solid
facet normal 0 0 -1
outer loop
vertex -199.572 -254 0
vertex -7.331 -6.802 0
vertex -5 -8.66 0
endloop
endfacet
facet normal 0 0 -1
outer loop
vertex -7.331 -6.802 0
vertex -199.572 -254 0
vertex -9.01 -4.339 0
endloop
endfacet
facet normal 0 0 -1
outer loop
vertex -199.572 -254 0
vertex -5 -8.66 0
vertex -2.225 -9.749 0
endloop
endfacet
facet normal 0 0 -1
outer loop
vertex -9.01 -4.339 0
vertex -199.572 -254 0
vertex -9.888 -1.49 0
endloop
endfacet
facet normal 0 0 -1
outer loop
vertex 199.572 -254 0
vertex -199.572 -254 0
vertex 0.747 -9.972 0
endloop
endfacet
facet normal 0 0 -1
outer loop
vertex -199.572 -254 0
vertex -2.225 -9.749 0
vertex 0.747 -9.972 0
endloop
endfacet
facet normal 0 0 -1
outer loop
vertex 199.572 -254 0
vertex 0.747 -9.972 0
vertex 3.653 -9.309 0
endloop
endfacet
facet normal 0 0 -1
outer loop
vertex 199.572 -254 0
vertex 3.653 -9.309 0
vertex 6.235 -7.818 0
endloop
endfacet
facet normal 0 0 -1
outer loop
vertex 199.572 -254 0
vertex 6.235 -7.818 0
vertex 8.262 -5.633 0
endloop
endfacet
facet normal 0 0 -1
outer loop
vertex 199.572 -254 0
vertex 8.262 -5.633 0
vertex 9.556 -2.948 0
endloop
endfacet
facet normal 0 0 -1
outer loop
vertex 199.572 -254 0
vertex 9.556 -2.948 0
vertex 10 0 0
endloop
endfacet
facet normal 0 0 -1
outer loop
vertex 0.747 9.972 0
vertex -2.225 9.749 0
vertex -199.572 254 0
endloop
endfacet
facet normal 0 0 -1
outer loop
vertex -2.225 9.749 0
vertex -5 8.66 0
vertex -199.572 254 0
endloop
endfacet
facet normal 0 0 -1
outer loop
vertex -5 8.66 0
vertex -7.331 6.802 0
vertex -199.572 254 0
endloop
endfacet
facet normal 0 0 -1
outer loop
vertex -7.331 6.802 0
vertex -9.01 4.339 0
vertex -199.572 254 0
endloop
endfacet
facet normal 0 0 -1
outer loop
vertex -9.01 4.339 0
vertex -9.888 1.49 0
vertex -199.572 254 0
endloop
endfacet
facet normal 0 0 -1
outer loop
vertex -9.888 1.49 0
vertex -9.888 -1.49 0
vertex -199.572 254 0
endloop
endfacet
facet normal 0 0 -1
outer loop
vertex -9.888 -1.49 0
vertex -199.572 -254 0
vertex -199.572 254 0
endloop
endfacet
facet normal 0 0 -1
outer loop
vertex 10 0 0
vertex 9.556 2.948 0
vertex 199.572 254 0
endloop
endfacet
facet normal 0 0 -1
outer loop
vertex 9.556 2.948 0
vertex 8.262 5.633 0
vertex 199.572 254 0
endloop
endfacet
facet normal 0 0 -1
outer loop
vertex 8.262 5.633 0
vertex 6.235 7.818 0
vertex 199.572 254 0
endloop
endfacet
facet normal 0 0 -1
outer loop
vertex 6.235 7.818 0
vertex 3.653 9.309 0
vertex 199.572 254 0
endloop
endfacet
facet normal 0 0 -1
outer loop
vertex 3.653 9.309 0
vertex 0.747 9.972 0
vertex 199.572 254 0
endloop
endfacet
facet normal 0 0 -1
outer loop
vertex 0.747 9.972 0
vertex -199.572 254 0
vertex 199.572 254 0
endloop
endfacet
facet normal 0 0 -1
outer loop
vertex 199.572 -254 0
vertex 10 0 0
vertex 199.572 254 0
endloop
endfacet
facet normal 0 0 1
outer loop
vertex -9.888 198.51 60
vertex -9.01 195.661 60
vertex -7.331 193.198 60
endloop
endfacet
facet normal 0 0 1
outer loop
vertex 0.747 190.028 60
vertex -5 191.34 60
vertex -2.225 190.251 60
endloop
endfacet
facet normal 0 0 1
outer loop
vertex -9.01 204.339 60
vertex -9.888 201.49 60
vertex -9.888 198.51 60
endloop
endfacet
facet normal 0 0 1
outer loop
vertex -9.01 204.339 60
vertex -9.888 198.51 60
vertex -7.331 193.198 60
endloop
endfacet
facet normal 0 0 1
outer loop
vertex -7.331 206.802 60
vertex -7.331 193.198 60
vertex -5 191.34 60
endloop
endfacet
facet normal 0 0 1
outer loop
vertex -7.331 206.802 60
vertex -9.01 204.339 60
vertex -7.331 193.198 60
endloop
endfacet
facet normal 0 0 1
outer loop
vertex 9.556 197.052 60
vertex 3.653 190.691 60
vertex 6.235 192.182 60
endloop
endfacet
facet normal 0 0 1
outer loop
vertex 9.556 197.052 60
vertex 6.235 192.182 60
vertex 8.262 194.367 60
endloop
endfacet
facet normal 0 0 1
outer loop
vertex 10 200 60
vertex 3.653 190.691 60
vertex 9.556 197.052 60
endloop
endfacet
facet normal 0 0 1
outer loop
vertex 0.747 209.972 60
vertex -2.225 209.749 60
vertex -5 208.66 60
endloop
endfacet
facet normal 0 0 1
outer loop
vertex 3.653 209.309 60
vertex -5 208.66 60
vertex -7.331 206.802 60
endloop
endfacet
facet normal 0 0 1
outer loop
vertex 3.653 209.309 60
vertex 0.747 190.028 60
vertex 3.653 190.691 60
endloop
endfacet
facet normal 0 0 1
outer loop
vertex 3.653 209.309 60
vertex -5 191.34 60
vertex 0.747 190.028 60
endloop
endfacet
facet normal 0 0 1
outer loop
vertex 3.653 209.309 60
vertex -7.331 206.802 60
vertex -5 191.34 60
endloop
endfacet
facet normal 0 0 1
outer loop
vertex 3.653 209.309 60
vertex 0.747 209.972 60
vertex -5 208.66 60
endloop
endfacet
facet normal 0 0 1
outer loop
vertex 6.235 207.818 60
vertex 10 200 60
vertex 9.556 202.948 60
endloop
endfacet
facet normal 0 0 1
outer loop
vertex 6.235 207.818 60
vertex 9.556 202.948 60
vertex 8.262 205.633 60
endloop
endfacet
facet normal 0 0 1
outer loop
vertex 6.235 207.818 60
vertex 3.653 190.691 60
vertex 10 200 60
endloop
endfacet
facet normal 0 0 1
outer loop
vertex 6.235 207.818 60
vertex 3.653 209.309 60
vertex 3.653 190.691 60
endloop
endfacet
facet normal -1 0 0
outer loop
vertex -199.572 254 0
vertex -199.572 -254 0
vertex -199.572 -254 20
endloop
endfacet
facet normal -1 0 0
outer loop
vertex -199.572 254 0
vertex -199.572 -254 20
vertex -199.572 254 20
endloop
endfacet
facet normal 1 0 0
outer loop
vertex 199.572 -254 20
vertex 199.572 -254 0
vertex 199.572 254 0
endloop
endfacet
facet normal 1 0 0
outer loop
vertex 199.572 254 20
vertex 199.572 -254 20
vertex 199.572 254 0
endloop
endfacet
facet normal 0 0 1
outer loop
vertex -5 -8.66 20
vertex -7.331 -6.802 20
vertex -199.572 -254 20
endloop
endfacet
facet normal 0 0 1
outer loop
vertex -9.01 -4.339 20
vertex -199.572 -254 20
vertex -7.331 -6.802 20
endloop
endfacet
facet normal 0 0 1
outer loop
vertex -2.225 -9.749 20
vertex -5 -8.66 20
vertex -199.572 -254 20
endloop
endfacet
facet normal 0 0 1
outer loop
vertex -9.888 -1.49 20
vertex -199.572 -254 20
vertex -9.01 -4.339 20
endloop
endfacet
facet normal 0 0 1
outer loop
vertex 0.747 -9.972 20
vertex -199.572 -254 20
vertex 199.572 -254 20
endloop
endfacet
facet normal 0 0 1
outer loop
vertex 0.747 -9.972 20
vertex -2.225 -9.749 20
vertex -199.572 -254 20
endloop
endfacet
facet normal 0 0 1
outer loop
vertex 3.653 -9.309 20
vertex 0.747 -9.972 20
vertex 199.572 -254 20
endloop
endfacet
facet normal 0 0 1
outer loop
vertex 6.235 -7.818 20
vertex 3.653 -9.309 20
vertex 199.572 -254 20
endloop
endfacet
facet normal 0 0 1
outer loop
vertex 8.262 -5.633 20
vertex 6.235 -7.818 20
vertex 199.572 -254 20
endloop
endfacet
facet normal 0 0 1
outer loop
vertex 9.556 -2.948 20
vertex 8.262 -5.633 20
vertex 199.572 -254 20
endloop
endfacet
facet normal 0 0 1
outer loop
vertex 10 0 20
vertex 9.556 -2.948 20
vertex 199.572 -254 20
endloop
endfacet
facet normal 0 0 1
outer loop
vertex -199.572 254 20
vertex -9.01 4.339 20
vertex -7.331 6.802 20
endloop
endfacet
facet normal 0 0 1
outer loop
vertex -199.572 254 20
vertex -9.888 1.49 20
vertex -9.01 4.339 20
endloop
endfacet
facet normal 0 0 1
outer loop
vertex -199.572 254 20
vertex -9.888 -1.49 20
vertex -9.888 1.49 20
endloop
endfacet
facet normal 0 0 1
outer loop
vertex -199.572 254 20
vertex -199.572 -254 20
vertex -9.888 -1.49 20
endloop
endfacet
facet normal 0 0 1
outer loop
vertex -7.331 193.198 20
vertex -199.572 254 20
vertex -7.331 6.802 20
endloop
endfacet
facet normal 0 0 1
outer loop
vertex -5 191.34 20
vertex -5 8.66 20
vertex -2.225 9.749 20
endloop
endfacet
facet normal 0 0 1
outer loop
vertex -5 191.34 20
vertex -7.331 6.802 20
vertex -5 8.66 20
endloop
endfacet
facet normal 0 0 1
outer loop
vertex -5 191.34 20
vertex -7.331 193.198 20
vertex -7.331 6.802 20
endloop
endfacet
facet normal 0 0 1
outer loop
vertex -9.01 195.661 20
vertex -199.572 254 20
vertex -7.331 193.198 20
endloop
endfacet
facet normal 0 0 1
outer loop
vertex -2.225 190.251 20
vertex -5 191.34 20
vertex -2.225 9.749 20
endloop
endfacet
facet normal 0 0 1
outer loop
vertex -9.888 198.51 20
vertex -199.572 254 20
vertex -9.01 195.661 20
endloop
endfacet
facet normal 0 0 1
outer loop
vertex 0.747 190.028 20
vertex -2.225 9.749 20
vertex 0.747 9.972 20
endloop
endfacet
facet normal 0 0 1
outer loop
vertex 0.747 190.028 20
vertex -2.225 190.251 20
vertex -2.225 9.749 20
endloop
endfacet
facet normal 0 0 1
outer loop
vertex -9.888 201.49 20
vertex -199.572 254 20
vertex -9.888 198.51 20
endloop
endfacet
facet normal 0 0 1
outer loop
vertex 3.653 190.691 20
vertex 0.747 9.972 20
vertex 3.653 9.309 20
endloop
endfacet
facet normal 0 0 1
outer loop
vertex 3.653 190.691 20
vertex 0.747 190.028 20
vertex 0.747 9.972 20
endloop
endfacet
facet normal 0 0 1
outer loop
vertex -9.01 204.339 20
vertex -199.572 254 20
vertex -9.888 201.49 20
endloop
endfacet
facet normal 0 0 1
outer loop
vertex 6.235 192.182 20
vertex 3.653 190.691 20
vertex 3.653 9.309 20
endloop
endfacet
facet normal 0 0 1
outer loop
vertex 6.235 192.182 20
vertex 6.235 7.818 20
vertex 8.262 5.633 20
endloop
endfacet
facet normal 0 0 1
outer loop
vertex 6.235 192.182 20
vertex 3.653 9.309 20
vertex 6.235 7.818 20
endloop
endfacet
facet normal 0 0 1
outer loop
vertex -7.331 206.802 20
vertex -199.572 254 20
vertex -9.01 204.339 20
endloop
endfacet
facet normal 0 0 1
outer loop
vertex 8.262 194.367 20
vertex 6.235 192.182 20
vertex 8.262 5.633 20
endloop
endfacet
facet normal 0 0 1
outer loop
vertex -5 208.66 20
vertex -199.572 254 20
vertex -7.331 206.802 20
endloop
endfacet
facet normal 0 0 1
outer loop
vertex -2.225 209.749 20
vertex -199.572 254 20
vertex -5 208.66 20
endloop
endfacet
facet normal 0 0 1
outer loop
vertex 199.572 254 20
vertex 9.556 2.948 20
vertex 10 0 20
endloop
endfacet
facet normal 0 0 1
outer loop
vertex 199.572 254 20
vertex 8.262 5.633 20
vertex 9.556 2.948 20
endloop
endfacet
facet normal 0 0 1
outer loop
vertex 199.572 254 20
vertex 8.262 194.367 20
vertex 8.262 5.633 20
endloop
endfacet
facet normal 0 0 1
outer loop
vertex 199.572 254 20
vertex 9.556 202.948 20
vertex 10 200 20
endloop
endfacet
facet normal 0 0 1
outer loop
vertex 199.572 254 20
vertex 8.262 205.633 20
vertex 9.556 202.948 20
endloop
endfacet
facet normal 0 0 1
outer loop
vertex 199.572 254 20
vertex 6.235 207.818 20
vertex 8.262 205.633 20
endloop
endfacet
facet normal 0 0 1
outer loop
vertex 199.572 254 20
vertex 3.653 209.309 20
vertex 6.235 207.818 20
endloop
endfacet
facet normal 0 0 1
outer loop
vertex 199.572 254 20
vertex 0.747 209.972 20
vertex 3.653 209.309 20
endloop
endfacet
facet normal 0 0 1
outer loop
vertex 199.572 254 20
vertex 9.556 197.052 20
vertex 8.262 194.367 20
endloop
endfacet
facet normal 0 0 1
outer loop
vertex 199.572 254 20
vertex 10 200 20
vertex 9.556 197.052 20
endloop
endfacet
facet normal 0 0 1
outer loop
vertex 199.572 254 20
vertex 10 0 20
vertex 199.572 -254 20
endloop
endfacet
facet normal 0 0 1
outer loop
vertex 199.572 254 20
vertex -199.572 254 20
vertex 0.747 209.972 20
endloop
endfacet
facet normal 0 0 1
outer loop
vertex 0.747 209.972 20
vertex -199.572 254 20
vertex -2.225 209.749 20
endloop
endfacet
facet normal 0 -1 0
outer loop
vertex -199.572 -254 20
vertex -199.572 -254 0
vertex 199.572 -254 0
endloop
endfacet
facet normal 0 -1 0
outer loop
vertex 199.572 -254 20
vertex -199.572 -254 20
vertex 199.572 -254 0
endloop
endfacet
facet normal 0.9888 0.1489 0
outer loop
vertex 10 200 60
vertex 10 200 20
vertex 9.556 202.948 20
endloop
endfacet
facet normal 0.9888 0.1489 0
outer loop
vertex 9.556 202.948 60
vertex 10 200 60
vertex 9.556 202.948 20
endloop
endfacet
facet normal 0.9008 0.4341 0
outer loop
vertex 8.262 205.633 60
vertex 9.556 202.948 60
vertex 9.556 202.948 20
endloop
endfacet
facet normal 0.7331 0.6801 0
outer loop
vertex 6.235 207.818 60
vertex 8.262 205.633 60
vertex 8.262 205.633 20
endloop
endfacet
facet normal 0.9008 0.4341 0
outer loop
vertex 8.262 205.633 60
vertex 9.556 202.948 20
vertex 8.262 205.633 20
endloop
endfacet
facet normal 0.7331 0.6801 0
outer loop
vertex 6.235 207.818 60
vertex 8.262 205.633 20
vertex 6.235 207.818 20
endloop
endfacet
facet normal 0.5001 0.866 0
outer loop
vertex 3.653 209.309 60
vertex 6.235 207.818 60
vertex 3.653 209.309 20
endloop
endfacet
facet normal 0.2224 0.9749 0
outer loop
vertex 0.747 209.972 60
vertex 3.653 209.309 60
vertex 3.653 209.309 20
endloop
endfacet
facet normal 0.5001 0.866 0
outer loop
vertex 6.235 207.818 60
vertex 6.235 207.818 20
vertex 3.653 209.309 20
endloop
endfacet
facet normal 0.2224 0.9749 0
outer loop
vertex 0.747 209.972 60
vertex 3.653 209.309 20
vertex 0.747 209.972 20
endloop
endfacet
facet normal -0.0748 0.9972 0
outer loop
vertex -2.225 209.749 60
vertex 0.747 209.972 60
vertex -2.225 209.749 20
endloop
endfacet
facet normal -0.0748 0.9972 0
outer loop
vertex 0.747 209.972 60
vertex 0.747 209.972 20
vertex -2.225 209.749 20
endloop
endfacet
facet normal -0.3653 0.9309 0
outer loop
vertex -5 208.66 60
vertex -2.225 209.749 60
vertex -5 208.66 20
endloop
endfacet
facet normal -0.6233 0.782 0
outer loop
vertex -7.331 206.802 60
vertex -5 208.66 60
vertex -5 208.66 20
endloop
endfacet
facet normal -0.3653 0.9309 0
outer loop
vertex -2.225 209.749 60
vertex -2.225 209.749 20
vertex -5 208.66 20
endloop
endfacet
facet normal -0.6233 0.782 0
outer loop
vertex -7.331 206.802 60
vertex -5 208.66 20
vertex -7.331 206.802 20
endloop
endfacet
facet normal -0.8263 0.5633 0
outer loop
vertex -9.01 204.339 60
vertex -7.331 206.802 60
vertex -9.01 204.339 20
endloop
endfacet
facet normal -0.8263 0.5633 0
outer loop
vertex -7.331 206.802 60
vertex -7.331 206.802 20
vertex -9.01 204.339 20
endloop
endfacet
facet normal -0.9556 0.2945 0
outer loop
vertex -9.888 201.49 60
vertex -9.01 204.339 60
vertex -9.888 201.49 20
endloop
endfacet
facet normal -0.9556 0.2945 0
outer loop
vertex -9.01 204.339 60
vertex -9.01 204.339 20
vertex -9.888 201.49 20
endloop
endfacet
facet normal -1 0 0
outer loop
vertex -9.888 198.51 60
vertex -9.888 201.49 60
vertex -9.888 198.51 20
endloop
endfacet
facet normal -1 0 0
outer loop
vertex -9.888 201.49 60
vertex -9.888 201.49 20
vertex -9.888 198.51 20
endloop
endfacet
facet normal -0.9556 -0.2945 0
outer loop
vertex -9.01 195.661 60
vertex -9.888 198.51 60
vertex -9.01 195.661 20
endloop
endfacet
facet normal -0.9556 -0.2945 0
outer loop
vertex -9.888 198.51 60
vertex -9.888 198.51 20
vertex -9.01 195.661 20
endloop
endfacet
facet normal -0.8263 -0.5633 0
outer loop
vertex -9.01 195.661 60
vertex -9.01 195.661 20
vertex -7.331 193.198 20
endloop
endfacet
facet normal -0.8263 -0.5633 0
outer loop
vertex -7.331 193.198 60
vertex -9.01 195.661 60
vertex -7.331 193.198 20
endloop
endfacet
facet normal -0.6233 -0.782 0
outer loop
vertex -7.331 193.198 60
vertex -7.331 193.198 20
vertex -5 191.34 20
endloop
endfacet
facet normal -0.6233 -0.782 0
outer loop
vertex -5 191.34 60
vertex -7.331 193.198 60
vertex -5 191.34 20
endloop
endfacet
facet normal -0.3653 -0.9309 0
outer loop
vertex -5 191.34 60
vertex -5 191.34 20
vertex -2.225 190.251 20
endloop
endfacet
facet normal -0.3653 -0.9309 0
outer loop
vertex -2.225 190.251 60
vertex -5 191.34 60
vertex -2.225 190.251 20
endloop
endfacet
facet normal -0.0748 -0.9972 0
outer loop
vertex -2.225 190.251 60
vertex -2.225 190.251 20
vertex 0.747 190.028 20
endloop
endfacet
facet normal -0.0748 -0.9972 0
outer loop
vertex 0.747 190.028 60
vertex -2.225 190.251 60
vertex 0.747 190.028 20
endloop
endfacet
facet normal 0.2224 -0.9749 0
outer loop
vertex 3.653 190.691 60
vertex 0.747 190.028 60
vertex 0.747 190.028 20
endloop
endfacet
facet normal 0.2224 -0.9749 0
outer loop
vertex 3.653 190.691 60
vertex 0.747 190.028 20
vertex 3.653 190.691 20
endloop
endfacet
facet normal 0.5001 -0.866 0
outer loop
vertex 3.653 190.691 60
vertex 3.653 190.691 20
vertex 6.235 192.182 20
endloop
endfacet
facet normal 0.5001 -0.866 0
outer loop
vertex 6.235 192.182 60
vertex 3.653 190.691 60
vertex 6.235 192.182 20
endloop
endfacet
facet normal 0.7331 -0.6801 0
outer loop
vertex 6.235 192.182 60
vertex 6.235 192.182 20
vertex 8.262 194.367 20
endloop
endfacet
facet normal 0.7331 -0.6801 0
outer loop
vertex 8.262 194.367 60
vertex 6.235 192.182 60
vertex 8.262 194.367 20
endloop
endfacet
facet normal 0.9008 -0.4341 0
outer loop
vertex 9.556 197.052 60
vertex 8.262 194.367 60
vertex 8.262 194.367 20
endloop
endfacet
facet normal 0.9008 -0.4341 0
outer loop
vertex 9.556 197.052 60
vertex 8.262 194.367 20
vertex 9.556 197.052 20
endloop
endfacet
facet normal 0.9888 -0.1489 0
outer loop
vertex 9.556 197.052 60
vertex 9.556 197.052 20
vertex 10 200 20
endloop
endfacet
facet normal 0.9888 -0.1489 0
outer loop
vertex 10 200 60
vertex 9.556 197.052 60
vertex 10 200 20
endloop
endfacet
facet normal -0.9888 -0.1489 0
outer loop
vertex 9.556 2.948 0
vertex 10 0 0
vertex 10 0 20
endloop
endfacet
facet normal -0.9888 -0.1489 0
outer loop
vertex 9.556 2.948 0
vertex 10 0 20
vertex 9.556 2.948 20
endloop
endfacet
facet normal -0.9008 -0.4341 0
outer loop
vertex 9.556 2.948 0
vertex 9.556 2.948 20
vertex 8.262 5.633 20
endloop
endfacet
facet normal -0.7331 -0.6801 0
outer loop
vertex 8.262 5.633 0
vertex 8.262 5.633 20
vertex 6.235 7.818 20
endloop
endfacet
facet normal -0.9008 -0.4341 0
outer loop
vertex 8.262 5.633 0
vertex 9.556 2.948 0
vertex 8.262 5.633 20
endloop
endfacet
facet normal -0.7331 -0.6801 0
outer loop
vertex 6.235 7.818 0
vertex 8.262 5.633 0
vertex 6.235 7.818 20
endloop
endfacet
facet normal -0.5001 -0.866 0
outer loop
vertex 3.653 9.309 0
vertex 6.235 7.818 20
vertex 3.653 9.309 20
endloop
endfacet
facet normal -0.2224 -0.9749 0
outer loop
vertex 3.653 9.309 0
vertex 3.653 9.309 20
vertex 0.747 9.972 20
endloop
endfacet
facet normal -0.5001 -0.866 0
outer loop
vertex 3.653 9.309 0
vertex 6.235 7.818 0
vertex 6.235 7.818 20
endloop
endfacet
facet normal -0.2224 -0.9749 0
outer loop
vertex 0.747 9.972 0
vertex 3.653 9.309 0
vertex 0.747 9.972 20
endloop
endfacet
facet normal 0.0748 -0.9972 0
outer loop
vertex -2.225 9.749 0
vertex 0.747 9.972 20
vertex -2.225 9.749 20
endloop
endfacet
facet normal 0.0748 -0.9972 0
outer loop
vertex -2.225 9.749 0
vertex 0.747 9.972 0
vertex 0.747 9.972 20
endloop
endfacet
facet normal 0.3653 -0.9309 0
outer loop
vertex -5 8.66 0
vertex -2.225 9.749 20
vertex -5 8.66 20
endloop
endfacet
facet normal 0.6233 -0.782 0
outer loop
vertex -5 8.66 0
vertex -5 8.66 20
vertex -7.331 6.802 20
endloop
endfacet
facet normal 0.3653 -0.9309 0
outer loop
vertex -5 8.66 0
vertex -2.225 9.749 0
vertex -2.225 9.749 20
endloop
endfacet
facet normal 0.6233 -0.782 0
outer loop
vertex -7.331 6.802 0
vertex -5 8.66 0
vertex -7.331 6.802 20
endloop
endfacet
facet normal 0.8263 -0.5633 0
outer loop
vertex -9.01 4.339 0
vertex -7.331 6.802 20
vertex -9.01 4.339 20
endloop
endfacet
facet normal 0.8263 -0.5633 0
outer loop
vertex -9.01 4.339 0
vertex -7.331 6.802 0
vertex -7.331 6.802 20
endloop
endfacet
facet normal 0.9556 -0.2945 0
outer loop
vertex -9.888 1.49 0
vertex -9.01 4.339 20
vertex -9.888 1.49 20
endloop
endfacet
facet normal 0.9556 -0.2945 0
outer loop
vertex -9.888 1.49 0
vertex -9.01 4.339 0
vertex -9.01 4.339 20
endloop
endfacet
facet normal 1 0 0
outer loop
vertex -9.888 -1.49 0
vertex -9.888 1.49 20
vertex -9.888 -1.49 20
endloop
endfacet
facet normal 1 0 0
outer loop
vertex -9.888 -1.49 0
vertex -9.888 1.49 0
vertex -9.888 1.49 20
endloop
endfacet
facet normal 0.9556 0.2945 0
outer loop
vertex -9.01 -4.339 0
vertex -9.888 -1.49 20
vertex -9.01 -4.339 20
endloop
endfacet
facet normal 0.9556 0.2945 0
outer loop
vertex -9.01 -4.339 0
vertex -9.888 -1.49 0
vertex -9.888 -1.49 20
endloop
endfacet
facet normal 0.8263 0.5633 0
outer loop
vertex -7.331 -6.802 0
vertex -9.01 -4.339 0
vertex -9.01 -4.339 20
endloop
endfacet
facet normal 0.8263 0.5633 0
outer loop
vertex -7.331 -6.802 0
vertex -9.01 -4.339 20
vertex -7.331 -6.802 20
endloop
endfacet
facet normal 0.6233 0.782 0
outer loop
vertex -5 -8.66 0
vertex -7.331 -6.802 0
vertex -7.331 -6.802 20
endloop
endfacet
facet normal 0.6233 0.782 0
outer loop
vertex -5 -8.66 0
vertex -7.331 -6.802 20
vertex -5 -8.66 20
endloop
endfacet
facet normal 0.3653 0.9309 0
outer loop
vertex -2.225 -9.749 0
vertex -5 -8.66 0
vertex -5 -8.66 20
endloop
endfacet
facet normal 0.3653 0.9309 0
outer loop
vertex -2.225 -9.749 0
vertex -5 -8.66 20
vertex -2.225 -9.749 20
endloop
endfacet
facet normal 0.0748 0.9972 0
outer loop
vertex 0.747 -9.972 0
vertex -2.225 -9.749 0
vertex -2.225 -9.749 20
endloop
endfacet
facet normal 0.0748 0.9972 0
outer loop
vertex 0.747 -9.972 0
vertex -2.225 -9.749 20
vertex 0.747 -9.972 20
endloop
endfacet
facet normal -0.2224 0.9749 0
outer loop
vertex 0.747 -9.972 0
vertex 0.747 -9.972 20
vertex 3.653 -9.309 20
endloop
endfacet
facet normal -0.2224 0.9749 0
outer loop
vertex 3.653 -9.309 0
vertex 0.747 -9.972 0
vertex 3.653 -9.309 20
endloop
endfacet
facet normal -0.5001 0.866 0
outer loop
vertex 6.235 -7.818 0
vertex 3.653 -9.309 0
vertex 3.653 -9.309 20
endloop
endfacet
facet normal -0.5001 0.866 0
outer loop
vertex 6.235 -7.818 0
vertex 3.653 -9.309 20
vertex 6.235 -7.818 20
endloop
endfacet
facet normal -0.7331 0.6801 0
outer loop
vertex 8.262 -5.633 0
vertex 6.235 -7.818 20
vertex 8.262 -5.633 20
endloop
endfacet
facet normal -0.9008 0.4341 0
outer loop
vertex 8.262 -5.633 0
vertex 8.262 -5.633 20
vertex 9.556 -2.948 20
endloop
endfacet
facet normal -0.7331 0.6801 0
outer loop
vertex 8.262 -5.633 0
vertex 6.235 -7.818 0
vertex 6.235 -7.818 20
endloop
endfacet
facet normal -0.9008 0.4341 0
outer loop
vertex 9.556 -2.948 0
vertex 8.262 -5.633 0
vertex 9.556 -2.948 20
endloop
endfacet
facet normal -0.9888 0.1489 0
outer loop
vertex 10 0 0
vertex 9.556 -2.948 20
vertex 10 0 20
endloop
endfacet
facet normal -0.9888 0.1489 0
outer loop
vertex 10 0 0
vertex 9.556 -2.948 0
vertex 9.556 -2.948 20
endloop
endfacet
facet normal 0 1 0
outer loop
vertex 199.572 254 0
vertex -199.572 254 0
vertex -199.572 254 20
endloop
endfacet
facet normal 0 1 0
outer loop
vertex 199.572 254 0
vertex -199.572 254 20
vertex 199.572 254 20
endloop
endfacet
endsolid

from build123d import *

# Parameters (mm, degrees)
SKETCH1_W           = 399.143716184
SKETCH1_H           = 508
SKETCH1_R           = 10
BOSS_EXTRUDE1_DEPTH = 20
SKETCH1_2_R         = 10
BOSS_EXTRUDE2_DEPTH = 60


with BuildPart() as part:
    # Sketch1 → Boss-Extrude1 (new body)
    with BuildSketch(Plane.XY):
        Rectangle(SKETCH1_W, SKETCH1_H)
        Circle(SKETCH1_R, mode=Mode.SUBTRACT)
        with Locations((0, 200)):
            Circle(SKETCH1_R, mode=Mode.SUBTRACT)
    extrude(amount=BOSS_EXTRUDE1_DEPTH)

    # Sketch1<2> → Boss-Extrude2 (add)
    with BuildSketch(Plane.XY):
        with Locations((0, 200)):
            Circle(SKETCH1_2_R)
    extrude(amount=BOSS_EXTRUDE2_DEPTH)


solid = part.part
